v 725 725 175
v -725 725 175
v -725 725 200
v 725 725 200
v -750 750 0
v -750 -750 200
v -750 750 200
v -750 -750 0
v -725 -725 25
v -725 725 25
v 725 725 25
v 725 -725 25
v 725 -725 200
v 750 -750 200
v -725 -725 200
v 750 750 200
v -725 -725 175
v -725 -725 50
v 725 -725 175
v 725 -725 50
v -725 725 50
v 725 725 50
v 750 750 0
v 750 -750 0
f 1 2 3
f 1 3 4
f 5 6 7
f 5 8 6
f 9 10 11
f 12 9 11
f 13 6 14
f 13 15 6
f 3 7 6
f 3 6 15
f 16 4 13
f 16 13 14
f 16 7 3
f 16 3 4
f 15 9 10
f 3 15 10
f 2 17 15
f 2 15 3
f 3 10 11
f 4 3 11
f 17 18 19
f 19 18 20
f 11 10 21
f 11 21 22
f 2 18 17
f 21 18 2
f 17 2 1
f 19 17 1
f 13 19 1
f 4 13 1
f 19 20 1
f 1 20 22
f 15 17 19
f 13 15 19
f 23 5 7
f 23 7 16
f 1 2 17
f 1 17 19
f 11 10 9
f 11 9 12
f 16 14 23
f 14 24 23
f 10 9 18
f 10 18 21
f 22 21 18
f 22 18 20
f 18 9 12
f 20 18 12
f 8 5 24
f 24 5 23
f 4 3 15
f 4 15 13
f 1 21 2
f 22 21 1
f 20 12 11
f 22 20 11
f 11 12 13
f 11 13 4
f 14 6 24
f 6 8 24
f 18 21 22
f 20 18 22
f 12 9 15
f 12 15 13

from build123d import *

# Parameters (mm, degrees)
F0_W     = 1500
F0_H     = 1500
F1_DEPTH = 25
F2_W     = 1500
F2_H     = 1500
F2_W_2   = 1450
F2_H_2   = 1450
F3_DEPTH = 175
F4_DEPTH = 25
F5_DEPTH = 125
F6_DEPTH = 25


with BuildPart() as f1:
    # F0 (on Top) → F1 (new body)
    with BuildSketch(Plane.XY):
        Rectangle(F0_W, F0_H)
    extrude(amount=F1_DEPTH)

    # F2 (on face) → F3 (join)
    with BuildSketch(Plane.XY.offset(25)):
        Rectangle(F2_W, F2_H)
        Rectangle(F2_W_2, F2_H_2, mode=Mode.SUBTRACT)
    extrude(amount=F3_DEPTH)


with BuildPart() as f4:
    # F4 (new): a face of the model
    f4_faces = [f1.part.faces().sort_by_distance(p)[0] for p in [
        (0, 0, 25),
    ]]
    extrude(f4_faces, amount=F4_DEPTH)


with BuildPart() as f5:
    # F5 (new): a face of the model
    f5_faces = [f4.part.faces().sort_by_distance(p)[0] for p in [
        (0, 0, 50),
    ]]
    extrude(f5_faces, amount=F5_DEPTH)


with BuildPart() as f6:
    # F6 (new): a face of the model
    f6_faces = [f5.part.faces().sort_by_distance(p)[0] for p in [
        (0, 0, 175),
    ]]
    extrude(f6_faces, amount=F6_DEPTH)


solid = Compound([f1.part, f4.part, f5.part, f6.part])
